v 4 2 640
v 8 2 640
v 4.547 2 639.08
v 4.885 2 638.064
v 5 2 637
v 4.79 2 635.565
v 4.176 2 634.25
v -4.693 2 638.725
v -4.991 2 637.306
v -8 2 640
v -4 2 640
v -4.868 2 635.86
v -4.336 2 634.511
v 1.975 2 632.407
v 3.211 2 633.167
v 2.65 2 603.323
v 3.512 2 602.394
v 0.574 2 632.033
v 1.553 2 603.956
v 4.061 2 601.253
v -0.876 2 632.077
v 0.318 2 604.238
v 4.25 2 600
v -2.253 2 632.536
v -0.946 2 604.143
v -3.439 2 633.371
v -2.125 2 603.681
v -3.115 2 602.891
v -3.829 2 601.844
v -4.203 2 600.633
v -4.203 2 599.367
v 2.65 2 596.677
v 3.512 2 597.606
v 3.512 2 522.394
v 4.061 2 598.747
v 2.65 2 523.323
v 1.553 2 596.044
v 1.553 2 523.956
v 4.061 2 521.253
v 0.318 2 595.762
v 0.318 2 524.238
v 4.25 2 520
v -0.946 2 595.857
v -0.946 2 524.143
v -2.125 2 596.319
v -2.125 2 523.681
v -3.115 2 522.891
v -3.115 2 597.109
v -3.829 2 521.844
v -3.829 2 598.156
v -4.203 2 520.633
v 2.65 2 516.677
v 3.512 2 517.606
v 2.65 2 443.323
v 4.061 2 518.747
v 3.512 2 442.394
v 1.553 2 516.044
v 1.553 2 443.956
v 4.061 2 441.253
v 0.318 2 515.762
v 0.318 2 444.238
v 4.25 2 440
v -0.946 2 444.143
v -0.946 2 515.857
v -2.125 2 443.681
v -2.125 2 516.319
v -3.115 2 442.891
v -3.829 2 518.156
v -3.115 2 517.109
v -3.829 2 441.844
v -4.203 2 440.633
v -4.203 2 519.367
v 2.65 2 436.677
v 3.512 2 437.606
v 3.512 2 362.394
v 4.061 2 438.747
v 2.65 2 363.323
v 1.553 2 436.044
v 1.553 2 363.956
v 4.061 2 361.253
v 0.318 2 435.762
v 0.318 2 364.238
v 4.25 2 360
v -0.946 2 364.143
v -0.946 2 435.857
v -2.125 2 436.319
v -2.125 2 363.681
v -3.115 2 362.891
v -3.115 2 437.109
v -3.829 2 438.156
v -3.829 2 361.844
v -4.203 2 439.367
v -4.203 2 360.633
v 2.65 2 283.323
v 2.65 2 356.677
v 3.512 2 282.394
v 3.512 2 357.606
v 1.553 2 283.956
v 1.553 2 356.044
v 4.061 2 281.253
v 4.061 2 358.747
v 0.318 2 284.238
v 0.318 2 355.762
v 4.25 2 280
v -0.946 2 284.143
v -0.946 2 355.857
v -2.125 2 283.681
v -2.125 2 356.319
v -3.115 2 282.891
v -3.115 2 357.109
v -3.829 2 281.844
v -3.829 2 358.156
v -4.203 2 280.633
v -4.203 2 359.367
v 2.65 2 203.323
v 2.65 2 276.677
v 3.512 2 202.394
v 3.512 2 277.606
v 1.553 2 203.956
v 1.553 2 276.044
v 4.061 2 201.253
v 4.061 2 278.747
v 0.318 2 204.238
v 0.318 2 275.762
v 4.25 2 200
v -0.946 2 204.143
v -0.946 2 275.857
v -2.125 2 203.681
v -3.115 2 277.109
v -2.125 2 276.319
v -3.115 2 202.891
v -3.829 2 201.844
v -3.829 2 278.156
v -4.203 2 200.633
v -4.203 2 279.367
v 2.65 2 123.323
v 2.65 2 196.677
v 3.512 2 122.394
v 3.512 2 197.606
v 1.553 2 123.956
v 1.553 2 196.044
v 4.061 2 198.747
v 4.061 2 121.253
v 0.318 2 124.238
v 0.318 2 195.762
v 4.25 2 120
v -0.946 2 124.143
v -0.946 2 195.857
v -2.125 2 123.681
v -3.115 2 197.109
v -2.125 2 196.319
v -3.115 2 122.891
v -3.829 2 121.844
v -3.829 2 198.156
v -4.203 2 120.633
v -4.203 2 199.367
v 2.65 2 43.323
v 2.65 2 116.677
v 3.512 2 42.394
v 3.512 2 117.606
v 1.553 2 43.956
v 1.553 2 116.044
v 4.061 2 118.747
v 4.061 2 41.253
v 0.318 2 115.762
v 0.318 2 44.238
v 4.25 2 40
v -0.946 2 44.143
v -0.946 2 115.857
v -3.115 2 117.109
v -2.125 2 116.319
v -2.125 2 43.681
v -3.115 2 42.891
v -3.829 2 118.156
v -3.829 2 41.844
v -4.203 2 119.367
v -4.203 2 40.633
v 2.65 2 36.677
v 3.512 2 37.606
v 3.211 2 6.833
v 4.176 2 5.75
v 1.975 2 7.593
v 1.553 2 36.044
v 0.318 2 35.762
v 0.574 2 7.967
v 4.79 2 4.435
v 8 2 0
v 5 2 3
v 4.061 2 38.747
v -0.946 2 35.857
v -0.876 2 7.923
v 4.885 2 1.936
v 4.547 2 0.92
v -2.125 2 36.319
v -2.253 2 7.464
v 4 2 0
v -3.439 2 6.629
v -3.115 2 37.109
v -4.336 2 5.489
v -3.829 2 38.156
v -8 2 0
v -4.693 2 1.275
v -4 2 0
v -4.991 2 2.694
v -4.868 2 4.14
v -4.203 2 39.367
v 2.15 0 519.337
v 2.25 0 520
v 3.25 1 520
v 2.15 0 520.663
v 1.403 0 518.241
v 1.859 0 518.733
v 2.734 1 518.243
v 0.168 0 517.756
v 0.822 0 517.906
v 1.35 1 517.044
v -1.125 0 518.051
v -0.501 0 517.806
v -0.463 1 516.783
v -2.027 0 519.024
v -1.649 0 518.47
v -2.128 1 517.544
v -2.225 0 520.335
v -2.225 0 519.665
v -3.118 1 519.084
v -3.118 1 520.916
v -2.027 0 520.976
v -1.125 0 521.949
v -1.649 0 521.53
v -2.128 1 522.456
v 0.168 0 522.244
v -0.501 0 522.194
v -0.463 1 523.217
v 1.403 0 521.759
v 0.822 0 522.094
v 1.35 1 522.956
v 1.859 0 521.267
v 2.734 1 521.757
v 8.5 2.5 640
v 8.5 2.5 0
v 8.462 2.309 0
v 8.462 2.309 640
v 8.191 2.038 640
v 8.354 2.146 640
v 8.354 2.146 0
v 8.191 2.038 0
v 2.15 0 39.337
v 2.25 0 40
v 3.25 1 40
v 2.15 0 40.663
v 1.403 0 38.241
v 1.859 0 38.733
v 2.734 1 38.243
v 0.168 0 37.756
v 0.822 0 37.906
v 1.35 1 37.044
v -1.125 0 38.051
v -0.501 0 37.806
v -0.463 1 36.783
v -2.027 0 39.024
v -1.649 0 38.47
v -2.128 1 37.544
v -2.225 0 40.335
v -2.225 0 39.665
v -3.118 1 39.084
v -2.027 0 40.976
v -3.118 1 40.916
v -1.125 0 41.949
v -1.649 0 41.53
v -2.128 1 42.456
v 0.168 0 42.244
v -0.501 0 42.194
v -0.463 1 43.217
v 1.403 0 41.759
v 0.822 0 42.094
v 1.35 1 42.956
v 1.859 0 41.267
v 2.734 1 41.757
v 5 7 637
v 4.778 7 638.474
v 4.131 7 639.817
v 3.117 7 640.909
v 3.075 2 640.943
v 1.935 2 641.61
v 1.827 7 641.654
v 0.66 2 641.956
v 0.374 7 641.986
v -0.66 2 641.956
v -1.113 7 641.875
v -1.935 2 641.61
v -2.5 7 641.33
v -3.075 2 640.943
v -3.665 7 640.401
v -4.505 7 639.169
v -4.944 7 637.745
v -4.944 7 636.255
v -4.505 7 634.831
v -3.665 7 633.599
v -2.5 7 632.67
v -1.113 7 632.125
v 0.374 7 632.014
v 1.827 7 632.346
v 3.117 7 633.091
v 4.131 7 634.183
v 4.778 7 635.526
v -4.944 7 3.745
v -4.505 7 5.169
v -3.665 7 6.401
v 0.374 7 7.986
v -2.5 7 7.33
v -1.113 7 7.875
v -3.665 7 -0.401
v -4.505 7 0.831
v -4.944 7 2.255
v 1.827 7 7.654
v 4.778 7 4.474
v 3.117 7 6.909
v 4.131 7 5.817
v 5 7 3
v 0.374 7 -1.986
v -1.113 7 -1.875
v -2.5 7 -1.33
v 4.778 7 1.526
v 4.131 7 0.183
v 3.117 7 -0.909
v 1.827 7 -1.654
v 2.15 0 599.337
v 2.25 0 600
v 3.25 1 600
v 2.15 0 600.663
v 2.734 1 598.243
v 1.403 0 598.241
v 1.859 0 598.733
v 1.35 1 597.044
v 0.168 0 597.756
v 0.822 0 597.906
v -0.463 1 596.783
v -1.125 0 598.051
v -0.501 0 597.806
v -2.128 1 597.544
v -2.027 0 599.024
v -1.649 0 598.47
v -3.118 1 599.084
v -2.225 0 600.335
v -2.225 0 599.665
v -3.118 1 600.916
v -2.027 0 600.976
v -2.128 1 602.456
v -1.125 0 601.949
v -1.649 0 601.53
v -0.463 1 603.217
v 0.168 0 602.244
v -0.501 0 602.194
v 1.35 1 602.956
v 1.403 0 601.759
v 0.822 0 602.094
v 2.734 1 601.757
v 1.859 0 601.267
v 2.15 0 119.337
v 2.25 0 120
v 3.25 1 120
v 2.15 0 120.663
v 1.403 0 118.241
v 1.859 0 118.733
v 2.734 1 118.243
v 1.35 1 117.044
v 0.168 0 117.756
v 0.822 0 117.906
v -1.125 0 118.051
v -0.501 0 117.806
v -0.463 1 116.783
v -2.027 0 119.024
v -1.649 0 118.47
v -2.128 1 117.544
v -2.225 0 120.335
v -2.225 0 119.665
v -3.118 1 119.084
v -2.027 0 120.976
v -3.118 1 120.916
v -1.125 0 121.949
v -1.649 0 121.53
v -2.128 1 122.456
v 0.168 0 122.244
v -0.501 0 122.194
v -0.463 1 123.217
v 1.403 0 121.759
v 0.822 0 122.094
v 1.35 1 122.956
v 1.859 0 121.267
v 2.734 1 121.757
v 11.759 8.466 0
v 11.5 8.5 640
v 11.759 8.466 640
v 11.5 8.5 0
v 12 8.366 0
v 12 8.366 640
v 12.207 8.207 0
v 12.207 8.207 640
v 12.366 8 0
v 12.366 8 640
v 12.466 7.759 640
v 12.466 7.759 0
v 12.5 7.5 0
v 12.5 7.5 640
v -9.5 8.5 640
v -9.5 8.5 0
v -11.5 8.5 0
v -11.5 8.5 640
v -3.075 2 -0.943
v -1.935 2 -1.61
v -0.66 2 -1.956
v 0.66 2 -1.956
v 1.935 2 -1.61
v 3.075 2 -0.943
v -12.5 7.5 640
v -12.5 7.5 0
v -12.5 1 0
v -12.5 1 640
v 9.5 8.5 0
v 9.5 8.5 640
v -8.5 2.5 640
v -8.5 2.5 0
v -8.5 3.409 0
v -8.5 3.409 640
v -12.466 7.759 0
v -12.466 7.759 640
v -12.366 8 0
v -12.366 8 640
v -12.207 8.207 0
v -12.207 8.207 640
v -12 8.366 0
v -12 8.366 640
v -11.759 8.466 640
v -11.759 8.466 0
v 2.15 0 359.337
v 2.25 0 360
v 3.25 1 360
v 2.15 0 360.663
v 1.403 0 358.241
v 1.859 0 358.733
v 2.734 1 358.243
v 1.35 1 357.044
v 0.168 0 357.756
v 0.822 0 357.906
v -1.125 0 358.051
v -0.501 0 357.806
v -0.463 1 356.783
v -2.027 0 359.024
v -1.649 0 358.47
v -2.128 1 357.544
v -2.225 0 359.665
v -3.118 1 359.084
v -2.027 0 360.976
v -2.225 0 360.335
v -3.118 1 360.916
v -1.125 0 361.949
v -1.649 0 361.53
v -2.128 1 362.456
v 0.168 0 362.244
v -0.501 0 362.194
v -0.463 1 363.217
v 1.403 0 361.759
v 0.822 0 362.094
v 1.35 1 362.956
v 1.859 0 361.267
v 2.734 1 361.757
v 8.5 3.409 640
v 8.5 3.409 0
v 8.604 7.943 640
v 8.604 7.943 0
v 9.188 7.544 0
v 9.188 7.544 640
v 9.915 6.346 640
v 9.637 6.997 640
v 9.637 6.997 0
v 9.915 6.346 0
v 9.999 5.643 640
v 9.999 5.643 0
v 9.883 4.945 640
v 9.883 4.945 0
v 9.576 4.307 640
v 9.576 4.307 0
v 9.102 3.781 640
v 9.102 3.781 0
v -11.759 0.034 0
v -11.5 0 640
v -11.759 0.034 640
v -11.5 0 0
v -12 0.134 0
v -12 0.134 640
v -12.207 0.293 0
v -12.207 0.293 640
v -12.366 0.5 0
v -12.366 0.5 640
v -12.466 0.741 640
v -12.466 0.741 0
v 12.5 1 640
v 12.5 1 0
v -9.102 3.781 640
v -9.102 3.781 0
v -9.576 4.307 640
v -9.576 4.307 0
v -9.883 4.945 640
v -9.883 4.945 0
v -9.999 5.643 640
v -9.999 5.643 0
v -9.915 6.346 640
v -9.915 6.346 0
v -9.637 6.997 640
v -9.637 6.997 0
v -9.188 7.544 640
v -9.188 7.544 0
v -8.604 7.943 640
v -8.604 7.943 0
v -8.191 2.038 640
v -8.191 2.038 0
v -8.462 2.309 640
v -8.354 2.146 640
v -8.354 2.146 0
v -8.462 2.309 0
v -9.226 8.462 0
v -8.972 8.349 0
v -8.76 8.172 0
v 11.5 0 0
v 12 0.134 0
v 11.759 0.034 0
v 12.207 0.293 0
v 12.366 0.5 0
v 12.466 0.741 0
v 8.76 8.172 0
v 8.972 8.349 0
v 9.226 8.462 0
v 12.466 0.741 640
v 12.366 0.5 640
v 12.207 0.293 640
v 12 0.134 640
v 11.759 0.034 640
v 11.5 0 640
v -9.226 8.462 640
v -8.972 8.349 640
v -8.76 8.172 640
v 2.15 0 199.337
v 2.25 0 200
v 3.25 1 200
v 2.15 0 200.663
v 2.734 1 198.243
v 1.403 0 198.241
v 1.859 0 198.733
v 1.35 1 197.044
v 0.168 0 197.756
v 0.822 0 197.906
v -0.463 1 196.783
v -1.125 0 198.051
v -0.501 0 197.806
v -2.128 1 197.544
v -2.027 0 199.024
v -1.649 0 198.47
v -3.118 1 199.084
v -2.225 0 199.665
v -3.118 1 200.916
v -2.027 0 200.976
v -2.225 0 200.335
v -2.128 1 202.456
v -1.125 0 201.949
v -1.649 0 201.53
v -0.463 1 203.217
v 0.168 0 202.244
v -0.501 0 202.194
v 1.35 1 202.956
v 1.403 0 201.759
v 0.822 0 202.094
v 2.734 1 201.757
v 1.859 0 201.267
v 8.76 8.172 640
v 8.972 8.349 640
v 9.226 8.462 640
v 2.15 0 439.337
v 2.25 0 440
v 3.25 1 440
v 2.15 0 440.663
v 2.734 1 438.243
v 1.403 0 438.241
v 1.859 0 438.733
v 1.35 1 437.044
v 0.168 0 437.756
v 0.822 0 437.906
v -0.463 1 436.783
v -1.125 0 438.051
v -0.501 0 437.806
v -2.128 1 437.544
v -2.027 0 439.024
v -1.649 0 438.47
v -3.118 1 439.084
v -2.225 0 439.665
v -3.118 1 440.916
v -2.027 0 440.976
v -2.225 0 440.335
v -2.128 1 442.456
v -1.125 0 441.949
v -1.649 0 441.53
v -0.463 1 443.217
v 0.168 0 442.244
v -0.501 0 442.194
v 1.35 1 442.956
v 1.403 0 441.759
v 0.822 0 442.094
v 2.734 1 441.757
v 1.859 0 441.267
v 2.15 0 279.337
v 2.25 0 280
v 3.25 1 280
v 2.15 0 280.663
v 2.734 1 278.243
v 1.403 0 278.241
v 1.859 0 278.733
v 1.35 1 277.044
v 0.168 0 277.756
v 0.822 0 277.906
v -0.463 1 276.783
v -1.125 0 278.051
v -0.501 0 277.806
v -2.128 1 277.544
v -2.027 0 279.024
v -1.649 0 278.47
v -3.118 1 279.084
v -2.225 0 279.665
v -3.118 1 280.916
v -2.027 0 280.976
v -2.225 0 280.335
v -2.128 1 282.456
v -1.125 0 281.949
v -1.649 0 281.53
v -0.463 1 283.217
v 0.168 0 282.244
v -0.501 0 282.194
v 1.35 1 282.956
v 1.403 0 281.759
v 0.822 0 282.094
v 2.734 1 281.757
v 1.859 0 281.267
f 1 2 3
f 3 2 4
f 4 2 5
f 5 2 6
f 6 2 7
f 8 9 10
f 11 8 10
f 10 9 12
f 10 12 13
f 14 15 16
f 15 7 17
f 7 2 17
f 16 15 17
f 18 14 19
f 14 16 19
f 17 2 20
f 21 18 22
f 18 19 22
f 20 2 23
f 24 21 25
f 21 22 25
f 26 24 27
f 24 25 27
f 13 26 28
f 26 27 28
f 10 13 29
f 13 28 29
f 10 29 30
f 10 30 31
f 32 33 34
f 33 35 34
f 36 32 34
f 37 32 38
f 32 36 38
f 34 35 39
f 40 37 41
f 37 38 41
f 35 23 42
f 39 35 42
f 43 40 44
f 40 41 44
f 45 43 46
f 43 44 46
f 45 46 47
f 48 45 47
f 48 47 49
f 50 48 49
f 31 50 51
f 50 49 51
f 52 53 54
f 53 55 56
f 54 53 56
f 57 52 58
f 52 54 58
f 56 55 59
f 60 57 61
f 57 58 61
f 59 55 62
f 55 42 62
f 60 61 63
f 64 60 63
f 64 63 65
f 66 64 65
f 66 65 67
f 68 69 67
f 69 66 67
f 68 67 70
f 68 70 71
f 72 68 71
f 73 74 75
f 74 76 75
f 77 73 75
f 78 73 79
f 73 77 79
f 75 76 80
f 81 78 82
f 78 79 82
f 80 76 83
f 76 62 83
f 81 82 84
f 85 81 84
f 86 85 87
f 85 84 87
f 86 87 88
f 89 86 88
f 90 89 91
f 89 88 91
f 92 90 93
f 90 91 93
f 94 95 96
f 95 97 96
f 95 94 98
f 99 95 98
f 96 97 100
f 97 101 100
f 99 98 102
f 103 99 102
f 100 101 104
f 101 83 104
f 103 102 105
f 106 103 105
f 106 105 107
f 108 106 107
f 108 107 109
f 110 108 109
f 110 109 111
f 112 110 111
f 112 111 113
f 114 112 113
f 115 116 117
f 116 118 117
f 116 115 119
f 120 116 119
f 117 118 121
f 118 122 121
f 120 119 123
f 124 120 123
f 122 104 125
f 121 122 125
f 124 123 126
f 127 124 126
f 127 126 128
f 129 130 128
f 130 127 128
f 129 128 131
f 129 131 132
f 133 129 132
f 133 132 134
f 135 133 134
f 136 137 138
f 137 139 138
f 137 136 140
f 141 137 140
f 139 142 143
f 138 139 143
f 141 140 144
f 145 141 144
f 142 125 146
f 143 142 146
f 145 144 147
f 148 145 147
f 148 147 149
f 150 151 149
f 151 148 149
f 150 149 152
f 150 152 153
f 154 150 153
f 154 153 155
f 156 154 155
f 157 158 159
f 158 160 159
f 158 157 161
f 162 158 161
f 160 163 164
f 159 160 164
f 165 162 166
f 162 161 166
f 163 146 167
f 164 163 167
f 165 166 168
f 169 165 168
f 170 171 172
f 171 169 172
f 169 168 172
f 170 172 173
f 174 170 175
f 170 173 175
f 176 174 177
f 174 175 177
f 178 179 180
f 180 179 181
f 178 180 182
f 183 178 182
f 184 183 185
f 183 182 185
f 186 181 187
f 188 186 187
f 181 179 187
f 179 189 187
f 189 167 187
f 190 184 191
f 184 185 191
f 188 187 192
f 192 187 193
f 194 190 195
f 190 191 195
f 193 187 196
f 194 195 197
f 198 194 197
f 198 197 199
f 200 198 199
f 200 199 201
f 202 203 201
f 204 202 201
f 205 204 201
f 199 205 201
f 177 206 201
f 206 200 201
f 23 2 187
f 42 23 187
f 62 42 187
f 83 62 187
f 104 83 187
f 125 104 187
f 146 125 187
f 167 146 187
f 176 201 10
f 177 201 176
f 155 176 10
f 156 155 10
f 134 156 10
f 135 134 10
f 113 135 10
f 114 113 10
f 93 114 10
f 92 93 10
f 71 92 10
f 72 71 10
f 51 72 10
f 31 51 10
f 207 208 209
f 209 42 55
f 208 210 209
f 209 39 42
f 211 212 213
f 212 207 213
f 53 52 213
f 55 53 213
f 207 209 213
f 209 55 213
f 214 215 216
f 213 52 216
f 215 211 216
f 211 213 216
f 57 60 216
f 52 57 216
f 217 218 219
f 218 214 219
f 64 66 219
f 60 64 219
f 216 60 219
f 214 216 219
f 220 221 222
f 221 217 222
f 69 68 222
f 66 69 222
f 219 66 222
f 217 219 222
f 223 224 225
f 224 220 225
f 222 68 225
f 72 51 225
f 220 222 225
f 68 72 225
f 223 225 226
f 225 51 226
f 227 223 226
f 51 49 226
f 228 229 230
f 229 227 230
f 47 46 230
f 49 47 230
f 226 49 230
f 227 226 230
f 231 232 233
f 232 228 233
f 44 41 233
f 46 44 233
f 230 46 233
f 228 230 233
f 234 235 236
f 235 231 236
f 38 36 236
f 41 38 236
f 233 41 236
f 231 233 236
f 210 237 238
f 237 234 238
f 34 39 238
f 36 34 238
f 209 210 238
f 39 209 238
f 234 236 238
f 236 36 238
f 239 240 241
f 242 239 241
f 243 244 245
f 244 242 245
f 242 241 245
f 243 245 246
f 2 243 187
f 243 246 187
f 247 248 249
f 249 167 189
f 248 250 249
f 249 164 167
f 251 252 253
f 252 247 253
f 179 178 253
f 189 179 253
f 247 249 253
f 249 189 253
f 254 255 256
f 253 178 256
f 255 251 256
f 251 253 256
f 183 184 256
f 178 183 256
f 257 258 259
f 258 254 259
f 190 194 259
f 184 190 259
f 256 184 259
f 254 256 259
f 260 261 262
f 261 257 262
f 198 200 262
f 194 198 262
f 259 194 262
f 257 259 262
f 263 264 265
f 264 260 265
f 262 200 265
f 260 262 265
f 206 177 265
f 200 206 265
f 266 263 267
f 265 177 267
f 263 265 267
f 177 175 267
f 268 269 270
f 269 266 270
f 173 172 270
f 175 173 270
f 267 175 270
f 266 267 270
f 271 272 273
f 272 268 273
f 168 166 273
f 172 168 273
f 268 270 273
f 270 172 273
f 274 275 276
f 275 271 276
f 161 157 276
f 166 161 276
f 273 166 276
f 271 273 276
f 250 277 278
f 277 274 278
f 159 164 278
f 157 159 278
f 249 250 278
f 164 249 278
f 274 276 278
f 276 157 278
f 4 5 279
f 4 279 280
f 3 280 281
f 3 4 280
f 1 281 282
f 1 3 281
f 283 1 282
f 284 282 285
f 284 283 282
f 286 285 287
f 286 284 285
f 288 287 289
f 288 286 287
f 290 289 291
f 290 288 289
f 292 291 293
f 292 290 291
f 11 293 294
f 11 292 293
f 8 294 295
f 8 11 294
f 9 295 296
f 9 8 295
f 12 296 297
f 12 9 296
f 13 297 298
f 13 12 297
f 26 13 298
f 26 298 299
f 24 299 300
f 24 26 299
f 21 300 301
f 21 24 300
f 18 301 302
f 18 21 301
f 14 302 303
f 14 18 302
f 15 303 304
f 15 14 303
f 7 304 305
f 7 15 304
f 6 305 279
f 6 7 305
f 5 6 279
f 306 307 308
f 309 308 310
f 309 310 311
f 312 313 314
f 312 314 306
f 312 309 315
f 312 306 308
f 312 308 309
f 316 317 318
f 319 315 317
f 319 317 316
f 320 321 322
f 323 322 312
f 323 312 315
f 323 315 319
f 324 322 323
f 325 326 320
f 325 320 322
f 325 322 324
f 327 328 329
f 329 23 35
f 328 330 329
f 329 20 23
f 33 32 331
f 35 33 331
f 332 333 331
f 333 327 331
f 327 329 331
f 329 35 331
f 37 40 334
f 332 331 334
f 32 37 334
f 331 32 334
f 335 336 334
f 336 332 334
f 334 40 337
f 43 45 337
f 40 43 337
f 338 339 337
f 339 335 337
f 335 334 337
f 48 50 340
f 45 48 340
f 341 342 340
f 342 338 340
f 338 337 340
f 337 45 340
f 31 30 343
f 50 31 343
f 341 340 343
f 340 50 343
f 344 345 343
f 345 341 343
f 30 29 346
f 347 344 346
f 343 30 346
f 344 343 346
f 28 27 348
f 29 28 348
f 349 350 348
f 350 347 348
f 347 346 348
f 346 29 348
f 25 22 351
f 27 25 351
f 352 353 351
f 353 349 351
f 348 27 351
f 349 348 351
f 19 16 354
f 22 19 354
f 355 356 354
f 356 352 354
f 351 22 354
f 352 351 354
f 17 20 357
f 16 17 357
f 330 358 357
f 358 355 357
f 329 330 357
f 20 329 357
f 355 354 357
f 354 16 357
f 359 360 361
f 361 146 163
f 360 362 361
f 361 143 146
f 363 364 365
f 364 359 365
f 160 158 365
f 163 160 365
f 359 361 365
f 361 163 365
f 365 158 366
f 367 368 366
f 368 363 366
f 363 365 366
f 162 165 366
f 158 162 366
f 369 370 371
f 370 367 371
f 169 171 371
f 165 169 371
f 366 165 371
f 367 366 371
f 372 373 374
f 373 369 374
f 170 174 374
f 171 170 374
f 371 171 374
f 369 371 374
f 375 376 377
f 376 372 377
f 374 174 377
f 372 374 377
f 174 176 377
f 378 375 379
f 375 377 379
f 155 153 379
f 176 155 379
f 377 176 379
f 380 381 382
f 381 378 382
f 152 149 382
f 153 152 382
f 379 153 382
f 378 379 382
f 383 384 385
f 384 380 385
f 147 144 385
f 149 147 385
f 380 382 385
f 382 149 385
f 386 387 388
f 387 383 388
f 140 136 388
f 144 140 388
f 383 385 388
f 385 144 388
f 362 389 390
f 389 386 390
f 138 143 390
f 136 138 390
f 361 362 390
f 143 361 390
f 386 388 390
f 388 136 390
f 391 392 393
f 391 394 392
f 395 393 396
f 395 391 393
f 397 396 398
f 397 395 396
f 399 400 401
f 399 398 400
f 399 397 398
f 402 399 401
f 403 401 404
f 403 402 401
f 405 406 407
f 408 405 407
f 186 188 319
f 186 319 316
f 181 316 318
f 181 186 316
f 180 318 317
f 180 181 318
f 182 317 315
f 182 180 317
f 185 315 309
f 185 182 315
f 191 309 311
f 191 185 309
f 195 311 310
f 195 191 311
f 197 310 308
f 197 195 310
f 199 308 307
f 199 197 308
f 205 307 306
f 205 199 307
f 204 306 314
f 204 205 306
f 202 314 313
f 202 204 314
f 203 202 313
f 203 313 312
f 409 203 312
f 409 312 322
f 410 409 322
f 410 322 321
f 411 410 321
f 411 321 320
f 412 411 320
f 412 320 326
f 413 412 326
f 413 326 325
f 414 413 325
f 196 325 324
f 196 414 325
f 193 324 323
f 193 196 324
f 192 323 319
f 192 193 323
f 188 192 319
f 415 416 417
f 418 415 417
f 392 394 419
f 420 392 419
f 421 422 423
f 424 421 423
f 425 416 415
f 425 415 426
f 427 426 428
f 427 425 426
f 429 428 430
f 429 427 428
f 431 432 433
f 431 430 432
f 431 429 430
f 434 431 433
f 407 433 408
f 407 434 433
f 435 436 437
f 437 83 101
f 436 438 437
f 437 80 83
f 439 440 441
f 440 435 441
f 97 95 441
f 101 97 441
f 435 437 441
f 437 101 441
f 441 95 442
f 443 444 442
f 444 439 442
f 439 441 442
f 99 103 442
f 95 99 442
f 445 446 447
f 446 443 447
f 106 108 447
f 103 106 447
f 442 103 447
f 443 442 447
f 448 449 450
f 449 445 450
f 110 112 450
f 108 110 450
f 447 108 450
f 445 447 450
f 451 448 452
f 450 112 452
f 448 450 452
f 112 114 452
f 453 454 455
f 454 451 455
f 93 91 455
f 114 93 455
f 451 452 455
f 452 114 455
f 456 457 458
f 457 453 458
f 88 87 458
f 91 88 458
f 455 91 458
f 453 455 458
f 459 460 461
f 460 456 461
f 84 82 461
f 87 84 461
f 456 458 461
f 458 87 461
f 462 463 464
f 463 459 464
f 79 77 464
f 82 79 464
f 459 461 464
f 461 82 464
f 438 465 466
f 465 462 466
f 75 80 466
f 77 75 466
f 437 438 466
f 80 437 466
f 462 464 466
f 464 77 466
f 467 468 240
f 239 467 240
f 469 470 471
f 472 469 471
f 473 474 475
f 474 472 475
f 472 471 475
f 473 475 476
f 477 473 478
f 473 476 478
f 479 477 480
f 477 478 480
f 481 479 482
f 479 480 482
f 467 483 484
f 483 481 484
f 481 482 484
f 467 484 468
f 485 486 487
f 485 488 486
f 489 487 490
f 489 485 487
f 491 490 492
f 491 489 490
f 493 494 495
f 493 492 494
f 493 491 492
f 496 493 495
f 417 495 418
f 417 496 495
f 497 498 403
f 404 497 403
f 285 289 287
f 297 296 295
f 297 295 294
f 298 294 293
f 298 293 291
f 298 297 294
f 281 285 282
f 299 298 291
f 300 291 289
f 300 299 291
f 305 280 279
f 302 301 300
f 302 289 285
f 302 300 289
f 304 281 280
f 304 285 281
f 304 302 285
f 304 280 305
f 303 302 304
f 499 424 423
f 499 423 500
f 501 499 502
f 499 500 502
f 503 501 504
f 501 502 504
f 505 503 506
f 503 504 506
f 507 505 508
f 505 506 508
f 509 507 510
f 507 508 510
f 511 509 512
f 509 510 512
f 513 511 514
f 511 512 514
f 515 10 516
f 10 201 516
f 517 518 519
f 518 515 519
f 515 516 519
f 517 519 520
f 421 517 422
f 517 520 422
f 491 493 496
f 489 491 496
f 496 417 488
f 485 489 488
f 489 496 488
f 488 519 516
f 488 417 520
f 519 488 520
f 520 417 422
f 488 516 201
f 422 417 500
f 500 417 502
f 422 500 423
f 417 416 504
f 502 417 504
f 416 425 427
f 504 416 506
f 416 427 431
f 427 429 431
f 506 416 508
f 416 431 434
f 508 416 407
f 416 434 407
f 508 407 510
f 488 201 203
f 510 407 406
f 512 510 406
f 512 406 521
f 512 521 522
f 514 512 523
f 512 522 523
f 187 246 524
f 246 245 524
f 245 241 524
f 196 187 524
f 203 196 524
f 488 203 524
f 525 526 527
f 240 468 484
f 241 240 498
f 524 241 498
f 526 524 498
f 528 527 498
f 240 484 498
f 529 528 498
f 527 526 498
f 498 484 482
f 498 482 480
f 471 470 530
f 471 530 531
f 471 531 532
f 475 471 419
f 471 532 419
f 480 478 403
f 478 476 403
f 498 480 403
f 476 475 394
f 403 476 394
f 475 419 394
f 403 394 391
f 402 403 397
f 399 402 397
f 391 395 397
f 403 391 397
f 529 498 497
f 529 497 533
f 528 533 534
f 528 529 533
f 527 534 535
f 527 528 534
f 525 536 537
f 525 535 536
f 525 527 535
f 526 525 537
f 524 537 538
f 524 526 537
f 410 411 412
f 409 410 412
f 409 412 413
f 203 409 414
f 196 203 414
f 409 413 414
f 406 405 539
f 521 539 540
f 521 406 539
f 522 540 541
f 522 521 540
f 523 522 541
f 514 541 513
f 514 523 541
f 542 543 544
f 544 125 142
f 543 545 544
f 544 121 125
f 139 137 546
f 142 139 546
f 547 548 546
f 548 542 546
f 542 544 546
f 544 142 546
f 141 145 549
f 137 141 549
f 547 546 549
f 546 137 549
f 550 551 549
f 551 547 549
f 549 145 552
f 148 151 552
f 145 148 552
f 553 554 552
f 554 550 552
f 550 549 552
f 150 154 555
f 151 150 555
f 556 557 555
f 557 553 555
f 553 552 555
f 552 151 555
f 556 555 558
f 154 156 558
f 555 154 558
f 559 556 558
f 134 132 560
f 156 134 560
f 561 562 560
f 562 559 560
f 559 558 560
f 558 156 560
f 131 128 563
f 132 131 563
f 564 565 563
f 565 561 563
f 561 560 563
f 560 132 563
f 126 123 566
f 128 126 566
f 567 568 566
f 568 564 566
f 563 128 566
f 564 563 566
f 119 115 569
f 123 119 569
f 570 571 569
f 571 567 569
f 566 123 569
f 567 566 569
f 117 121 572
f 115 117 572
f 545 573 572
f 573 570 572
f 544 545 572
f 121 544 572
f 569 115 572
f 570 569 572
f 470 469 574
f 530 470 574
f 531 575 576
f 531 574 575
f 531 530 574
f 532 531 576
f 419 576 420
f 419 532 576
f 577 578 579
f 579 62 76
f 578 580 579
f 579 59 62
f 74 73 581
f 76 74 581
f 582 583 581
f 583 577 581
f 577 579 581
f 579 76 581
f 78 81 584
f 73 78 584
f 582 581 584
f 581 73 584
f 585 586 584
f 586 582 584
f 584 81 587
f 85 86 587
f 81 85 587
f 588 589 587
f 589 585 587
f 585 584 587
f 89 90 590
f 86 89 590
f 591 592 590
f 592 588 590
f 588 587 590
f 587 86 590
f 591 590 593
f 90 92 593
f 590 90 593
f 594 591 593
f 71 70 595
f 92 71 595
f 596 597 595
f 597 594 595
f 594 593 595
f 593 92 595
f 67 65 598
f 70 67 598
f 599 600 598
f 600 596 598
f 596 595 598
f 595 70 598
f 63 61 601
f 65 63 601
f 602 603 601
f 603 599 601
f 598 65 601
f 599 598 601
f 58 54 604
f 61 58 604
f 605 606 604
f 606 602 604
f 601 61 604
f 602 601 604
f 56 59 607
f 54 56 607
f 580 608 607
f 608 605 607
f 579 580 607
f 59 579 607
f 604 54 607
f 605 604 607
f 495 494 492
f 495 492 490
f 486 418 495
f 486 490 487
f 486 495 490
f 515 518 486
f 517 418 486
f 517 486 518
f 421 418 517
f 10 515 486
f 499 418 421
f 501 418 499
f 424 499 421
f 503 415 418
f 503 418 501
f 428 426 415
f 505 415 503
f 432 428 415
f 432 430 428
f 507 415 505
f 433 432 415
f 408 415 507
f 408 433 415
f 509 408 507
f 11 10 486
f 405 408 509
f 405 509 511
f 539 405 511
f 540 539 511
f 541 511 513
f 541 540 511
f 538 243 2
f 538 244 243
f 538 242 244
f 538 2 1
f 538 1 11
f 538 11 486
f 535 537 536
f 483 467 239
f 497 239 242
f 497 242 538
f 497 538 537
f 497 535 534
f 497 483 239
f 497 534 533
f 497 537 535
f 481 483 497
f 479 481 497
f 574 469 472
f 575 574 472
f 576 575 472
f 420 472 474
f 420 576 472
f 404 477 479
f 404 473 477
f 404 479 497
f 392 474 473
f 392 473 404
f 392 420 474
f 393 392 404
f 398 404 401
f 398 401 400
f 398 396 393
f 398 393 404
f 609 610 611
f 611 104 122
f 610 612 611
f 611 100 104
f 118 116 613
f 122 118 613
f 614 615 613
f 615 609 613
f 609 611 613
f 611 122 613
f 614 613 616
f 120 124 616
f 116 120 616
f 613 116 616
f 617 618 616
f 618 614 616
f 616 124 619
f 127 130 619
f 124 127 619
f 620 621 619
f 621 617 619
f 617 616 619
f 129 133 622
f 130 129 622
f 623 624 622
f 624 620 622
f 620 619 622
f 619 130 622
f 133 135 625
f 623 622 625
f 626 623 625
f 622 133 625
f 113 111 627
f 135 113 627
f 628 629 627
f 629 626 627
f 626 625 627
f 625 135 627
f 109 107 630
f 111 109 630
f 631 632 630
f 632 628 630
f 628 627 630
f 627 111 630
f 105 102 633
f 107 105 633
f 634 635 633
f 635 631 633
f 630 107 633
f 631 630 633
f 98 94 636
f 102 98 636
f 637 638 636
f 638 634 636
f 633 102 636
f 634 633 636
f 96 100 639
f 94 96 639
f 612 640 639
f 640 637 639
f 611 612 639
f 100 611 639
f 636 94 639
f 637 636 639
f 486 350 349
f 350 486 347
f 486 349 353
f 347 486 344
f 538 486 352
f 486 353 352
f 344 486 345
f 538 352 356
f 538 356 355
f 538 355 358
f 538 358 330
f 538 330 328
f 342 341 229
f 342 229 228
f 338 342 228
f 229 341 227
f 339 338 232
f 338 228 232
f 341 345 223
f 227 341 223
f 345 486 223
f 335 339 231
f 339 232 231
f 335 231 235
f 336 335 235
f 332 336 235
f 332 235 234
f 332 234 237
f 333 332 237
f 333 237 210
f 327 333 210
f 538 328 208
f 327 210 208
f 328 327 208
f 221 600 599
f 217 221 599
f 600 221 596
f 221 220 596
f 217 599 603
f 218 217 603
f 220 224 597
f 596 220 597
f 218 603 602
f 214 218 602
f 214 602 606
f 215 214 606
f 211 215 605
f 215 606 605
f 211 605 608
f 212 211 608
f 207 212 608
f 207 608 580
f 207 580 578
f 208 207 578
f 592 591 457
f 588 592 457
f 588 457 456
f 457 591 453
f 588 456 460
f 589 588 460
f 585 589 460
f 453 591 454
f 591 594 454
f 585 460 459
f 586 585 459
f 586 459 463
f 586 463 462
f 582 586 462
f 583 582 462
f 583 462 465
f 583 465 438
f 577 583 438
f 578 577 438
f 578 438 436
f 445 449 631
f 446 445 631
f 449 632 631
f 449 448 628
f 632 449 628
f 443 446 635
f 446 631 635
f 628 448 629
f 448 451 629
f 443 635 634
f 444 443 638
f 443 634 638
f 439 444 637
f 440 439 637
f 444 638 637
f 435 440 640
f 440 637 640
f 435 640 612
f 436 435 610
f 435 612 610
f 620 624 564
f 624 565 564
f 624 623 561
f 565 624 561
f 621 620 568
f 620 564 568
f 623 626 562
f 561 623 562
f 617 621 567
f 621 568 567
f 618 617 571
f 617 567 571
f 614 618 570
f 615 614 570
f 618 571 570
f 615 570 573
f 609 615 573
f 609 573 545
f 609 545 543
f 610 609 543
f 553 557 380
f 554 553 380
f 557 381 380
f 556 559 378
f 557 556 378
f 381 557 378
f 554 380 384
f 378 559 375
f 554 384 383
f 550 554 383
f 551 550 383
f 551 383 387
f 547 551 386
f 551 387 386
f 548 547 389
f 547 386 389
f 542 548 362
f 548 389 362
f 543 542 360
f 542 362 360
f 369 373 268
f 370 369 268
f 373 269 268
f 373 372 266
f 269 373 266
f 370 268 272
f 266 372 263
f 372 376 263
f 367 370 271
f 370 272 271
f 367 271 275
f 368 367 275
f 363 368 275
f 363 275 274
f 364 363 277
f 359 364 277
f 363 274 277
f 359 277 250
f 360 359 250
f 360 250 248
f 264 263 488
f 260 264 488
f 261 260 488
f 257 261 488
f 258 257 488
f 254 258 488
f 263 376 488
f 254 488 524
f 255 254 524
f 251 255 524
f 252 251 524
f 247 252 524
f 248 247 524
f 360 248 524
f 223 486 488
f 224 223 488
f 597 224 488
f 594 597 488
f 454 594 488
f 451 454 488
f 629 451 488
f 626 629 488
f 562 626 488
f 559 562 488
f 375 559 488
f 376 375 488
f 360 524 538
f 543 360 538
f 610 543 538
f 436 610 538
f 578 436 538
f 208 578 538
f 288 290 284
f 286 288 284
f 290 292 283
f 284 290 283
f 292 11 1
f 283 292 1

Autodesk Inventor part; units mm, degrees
sketch "Sketch_1" plane through (0, 0, 0) normal (0, 0, 1) x (1, 0, 0)
  arc A0 (-12.5, 1) -> (-11.5, 0) centre (-11.5, 1) ccw
  line L0 (-11.5, 0) -> (11.5, 0)
  arc A1 (11.5, 0) -> (12.5, 1) centre (11.5, 1) ccw
  line L1 (12.5, 1) -> (12.5, 7.5)
  arc A2 (12.5, 7.5) -> (11.5, 8.5) centre (11.5, 7.5) ccw
  line L2 (11.5, 8.5) -> (9.5, 8.5)
  arc A3 (9.5, 8.5) -> (8.6036, 7.9432) centre (9.5, 7.5) ccw
  arc A4 (8.5, 3.4087) -> (8.6036, 7.9432) centre (7.5, 5.7) ccw
  line L3 (8.5, 3.4087) -> (8.5, 2.5)
  arc A5 (8, 2) -> (8.5, 2.5) centre (8, 2.5) ccw
  line L4 (8, 2) -> (-8, 2)
  arc A6 (-8.5, 2.5) -> (-8, 2) centre (-8, 2.5) ccw
  line L5 (-8.5, 2.5) -> (-8.5, 3.4087)
  arc A7 (-8.6036, 7.9432) -> (-8.5, 3.4087) centre (-7.5, 5.7) ccw
  arc A8 (-8.6036, 7.9432) -> (-9.5, 8.5) centre (-9.5, 7.5) ccw
  line L6 (-9.5, 8.5) -> (-11.5, 8.5)
  arc A9 (-11.5, 8.5) -> (-12.5, 7.5) centre (-11.5, 7.5) ccw
  line L7 (-12.5, 7.5) -> (-12.5, 1)
extrude "Extrusion1" add sketch "Sketch_1" along normal blind 640
sketch "Sketch_2" plane through (0, 0, 40) normal (0, 0, 1) x (1, 0, 0)
  line L0 (0, 0) -> (0, 2)
  line L1 (0, 2) -> (4.25, 2)
  line L2 (4.25, 2) -> (2.25, 0)
  line L3 (2.25, 0) -> (0, 0)
  line L4 (0, 0) -> (0, 2)
revolve "Revolution1" cut sketch "Sketch_2" angle 360 about axis through (0, 0, 40) along (0, -1, 0)
pattern_linear "Rectangular Pattern1" count 8 spacing 80 along (0, 0, 1) of "Revolution1"
sketch "Sketch_4" plane through (0, 2, 0) normal (0, 1, 0) x (1, 0, 0)
  circle A0 centre (0, -3) radius 5
extrude "Extrusion2" add sketch "Sketch_4" along normal blind 5
sketch "Sketch_5" plane through (0, 2, 0) normal (0, 1, 0) x (1, 0, 0)
  circle A0 centre (0, -637) radius 5
extrude "Extrusion3" add sketch "Sketch_5" along normal blind 5
ref_plane "rail25_to_dummy_XY" through (0, 0, 320) normal (0, 0, 1) x (1, 0, 0)
ref_plane "rail25_to_dummy_YZ" through (0, 0, 320) normal (1, 0, 0) x (0, 1, 0)
ref_plane "rail25_to_dummy_ZX" through (0, 0, 320) normal (0, 1, 0) x (0, 0, 1)
ref_plane "to_slider_XY" through (0, 12, 320) normal (0, 0, 1) x (1, 0, 0)
ref_plane "to_slider_YZ" through (0, 12, 320) normal (1, 0, 0) x (0, 1, 0)
ref_plane "to_slider_ZX" through (0, 12, 320) normal (0, 1, 0) x (0, 0, 1)
properties part number "RSRR25-640"
